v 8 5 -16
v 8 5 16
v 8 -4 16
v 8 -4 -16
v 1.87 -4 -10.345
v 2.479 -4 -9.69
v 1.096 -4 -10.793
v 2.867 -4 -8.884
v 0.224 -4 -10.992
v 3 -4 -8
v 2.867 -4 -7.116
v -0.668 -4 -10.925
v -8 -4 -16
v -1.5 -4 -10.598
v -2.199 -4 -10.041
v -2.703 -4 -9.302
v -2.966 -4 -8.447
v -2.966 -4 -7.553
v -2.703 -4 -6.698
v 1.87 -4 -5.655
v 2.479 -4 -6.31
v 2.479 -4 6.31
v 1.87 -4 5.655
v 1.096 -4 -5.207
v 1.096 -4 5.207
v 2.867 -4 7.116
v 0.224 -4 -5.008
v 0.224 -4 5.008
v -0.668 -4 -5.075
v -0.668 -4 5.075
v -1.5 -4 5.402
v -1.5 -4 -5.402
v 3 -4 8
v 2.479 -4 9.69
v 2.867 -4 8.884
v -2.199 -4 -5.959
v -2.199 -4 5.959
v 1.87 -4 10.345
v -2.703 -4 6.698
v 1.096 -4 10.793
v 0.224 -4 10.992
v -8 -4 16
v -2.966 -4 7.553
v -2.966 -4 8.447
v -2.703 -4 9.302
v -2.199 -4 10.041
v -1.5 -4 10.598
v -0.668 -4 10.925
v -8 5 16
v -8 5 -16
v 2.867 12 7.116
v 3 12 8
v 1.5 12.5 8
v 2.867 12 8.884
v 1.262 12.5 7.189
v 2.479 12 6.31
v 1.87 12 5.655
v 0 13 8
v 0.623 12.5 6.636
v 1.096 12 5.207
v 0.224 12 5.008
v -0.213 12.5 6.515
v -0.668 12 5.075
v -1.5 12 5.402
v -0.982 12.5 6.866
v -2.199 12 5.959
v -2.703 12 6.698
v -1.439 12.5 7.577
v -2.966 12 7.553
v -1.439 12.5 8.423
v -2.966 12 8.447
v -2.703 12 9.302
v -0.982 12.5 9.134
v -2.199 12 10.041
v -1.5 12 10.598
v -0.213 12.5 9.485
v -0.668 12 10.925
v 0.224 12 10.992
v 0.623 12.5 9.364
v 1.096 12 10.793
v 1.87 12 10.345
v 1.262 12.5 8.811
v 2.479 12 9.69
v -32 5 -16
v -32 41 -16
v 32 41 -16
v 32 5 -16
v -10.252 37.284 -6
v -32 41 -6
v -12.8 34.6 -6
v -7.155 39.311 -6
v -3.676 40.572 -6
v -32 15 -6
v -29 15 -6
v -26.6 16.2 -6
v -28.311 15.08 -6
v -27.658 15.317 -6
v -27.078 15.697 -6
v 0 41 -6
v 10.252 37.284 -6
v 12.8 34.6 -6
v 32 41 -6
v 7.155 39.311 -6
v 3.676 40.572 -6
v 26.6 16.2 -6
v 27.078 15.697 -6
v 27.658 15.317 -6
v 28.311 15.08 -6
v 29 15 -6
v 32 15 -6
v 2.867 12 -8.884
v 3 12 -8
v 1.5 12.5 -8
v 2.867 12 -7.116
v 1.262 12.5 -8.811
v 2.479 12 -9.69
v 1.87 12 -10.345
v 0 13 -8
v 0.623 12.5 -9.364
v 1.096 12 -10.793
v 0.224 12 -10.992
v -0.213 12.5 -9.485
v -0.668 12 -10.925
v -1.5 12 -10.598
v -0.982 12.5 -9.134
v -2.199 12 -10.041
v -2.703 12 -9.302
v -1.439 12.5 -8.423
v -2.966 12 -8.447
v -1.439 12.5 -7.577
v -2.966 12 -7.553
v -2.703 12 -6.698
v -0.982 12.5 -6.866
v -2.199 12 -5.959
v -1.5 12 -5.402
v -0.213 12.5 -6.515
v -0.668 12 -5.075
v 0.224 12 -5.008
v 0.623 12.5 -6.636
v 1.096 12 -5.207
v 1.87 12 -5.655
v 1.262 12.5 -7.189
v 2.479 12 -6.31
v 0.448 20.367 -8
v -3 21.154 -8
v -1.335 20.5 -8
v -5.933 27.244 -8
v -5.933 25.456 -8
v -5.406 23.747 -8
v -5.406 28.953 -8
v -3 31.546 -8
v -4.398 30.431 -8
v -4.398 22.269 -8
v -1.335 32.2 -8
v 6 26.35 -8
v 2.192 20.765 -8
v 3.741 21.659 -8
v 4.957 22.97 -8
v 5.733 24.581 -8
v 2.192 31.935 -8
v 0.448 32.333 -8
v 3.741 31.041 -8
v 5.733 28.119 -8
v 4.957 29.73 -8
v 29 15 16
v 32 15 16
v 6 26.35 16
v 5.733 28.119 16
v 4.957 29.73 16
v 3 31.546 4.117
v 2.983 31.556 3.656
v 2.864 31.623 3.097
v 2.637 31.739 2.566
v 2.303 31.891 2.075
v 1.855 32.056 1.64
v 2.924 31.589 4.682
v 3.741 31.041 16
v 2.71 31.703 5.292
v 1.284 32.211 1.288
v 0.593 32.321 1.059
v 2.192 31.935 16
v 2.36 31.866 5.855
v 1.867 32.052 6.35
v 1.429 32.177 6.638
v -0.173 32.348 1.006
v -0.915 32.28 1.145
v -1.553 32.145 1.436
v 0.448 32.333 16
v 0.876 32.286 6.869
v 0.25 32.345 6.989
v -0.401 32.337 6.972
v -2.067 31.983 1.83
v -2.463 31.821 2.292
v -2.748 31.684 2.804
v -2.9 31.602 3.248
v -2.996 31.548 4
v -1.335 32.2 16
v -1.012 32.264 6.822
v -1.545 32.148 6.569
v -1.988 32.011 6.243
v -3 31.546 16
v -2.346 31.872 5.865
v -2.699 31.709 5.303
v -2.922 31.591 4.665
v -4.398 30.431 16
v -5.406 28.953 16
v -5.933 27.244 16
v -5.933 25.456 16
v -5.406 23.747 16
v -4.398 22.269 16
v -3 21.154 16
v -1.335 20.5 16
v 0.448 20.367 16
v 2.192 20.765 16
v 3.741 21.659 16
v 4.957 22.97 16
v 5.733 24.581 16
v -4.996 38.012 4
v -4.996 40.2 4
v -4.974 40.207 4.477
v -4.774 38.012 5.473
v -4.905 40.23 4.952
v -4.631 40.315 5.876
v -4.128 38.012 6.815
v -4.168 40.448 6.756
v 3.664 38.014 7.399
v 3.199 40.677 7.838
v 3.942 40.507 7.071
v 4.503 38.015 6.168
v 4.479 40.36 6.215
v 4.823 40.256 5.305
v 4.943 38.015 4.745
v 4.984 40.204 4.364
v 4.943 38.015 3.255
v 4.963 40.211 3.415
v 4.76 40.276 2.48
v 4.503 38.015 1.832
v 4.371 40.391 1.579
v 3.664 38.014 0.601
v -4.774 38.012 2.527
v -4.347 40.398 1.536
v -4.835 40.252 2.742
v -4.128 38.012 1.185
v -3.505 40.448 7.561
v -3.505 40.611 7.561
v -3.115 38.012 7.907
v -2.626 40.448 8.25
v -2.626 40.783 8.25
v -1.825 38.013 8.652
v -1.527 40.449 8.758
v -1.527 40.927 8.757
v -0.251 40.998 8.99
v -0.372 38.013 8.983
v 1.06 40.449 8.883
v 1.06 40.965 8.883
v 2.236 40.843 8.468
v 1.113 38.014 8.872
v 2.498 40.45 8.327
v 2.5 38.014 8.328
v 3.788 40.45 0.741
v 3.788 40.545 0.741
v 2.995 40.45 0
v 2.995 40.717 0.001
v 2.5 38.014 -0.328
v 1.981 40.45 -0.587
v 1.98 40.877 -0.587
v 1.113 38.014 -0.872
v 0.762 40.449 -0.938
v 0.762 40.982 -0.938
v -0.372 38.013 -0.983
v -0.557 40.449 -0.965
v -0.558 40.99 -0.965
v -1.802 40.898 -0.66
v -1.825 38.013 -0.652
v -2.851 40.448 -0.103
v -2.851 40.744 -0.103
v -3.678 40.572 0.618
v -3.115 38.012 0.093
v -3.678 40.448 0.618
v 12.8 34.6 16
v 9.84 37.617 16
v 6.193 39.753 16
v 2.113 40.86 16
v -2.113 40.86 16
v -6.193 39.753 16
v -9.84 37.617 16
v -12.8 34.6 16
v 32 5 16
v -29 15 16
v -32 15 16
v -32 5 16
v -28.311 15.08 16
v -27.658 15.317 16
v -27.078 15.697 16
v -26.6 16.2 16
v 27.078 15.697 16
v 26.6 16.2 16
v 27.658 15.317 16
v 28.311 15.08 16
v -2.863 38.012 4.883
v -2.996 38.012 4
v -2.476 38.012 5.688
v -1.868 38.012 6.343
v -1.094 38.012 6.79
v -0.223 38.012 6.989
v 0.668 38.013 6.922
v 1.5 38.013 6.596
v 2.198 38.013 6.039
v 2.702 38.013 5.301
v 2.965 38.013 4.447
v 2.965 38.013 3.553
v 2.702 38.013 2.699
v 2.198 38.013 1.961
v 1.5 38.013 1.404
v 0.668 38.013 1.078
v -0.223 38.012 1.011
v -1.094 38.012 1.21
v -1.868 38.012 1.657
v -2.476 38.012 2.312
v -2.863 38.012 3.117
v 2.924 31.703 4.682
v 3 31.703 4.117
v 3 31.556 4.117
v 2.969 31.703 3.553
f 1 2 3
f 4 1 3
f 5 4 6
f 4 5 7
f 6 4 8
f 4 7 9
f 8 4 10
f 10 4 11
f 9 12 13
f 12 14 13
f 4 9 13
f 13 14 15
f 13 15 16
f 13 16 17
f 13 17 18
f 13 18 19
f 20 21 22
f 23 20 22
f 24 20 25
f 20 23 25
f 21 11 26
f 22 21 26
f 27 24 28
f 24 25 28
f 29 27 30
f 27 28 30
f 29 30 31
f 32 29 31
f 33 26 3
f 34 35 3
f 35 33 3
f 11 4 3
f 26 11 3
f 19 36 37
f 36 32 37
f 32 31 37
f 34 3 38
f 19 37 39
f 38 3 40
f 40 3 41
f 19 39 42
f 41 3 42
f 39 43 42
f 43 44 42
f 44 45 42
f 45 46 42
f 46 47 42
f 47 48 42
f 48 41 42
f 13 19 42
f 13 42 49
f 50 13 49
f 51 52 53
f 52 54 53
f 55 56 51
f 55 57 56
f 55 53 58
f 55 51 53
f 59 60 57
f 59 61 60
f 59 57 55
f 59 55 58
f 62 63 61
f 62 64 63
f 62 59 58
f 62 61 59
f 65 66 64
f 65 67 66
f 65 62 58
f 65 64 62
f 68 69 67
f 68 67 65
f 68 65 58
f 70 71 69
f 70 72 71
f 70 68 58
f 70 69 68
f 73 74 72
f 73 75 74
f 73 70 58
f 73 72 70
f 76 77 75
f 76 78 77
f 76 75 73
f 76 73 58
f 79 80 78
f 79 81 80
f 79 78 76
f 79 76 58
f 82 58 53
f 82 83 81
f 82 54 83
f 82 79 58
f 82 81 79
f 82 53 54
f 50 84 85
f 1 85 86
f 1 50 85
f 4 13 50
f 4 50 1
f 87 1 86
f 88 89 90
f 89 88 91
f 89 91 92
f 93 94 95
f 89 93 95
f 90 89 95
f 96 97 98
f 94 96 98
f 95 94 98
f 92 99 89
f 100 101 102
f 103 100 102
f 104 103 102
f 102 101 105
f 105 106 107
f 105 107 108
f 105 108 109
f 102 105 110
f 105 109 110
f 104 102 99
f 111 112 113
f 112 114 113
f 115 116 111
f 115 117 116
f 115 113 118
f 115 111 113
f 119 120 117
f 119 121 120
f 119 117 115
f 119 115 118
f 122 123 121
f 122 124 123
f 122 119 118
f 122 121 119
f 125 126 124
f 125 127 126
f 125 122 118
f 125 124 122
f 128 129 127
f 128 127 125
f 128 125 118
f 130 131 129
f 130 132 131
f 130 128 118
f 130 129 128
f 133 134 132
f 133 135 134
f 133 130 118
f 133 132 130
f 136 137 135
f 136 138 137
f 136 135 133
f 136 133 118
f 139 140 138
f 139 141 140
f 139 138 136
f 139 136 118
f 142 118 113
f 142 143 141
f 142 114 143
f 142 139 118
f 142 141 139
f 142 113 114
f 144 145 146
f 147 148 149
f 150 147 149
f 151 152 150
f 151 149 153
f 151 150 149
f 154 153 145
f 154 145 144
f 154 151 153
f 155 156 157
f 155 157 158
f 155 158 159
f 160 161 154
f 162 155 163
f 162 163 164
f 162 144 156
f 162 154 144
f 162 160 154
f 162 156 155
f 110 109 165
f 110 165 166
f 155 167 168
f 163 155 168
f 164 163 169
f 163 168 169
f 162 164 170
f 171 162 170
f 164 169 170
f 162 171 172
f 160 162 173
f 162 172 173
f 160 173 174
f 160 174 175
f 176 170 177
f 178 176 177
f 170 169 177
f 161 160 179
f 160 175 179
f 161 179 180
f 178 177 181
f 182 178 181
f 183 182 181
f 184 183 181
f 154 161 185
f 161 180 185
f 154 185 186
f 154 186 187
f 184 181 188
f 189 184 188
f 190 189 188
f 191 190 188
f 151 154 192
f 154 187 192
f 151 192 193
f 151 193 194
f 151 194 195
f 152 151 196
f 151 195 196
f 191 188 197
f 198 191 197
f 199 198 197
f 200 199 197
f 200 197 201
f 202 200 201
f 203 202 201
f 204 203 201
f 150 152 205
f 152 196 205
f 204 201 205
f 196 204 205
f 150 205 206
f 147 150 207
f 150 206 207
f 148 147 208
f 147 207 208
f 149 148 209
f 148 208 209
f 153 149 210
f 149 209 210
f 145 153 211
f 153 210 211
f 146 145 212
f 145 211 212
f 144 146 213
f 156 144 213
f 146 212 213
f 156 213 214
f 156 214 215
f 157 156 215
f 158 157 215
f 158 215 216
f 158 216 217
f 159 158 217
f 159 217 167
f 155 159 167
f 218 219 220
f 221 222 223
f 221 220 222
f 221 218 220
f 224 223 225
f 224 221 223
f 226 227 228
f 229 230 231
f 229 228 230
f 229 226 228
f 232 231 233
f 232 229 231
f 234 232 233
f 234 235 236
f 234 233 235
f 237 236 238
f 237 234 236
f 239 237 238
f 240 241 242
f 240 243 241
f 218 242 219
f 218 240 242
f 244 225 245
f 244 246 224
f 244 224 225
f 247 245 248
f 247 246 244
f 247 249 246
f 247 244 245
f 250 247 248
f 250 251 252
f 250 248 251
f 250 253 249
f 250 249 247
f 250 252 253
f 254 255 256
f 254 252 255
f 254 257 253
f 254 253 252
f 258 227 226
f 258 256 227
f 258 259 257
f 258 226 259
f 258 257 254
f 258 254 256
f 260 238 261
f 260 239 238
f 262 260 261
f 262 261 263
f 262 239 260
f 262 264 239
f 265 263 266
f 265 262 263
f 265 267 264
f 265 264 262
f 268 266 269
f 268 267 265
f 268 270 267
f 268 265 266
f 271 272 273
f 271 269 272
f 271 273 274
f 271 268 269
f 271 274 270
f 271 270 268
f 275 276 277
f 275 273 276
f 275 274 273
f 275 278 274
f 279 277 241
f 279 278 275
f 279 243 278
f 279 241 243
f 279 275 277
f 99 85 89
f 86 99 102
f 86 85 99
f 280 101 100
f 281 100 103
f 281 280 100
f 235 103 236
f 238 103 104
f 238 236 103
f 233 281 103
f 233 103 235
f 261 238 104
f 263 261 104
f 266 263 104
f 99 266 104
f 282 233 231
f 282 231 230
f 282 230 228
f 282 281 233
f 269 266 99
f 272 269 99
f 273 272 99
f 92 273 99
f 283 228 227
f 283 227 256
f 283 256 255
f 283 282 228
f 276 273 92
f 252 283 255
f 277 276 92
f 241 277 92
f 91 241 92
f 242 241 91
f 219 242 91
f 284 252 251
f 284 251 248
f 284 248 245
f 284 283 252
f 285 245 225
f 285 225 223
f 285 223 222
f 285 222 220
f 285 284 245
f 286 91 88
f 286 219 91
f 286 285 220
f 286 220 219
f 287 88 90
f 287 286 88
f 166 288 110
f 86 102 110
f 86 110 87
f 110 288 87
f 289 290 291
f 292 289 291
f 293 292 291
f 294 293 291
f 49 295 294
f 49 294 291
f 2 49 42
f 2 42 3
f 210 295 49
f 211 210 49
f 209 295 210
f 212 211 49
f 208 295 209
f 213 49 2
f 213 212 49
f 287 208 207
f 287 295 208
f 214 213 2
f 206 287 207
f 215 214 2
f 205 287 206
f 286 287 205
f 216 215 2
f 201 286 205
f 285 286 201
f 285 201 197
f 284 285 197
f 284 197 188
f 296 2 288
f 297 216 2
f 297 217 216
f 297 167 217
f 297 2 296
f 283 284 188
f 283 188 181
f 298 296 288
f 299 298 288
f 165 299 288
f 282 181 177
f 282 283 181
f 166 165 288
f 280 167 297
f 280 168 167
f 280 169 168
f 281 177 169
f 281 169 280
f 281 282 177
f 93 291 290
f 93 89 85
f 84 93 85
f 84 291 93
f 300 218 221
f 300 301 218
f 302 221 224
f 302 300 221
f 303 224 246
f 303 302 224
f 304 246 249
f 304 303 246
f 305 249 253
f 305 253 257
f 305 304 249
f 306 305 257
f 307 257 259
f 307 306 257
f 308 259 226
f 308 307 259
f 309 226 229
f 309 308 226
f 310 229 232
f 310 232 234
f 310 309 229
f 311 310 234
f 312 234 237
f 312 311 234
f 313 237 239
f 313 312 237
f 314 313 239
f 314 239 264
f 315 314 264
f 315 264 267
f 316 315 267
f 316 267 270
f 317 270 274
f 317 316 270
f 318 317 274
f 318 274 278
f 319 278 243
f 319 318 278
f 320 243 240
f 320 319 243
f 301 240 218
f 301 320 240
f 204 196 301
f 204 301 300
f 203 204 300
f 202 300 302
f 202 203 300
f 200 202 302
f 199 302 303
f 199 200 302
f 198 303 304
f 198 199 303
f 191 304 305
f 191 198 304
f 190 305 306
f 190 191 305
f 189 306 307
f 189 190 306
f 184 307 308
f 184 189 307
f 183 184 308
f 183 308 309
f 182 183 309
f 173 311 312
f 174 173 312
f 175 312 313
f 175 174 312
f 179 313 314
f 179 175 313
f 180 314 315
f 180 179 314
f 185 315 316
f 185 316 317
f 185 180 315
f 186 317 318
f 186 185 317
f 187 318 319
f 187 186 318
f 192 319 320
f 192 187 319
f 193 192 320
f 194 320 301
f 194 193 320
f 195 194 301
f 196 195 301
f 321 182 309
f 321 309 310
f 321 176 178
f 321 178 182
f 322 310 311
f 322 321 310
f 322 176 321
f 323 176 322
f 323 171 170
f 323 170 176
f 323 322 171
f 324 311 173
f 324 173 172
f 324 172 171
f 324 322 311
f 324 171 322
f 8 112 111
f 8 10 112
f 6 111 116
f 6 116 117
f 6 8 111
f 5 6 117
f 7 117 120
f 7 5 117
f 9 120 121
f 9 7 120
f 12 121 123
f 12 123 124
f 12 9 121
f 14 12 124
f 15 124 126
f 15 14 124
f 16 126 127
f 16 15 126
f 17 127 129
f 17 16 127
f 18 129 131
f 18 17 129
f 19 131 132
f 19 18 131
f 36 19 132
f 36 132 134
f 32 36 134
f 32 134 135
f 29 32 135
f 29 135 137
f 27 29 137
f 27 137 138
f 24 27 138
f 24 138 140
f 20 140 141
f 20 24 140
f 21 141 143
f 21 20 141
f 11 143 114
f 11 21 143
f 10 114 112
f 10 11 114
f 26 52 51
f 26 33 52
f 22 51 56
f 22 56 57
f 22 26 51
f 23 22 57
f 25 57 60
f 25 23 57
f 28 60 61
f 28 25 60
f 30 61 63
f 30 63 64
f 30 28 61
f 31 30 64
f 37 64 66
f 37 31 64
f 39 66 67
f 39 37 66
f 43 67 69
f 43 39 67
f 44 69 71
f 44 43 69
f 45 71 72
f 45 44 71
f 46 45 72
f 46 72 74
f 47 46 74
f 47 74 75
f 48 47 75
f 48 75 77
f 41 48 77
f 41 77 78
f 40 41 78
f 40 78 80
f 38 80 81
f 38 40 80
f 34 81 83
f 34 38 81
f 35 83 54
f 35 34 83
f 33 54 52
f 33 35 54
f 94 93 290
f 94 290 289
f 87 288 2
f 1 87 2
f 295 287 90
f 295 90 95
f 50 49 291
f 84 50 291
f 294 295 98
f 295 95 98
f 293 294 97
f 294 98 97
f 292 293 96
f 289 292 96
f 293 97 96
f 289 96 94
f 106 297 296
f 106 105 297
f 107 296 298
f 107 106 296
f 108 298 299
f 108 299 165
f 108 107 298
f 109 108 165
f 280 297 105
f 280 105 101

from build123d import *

# Parameters (mm, degrees)
SKETCH2_W           = 64
SKETCH2_H           = 32
BOSS_EXTRUDE1_DEPTH = 5
SKETCH3_W           = 64
SKETCH3_H           = 10
BOSS_EXTRUDE2_DEPTH = 36
SKETCH4_W           = 64
SKETCH4_H           = 22
BOSS_EXTRUDE3_DEPTH = 10
BOSS_EXTRUDE4_DEPTH = 22
CUT_EXTRUDE1_DEPTH  = 33
SKETCH7_R           = 6
CUT_EXTRUDE2_DEPTH  = 24
LPATTERN1_COUNT     = 2
LPATTERN1_PITCH     = 16
FILLET1_R           = 3


with BuildPart() as part:
    # Sketch2 → Boss-Extrude1 (new body, symmetric)
    with BuildSketch(Plane(origin=(0, 0, 0), x_dir=(1, 0, 0), z_dir=(0, 1, 0))):
        Rectangle(SKETCH2_W, SKETCH2_H)
    extrude(amount=BOSS_EXTRUDE1_DEPTH, both=True)

    # Sketch3 → Boss-Extrude2 (add)
    with BuildSketch(Plane(origin=(0, 5, 0), x_dir=(1, 0, 0), z_dir=(0, 1, 0))):
        with Locations((0, 11)):
            Rectangle(SKETCH3_W, SKETCH3_H)
    extrude(amount=BOSS_EXTRUDE2_DEPTH)

    # Sketch4 → Boss-Extrude3 (add)
    with BuildSketch(Plane(origin=(0, 5, 0), x_dir=(1, 0, 0), z_dir=(0, 1, 0))):
        with Locations((0, -5)):
            Rectangle(SKETCH4_W, SKETCH4_H)
    extrude(amount=BOSS_EXTRUDE3_DEPTH)

    # Sketch5 → Boss-Extrude4 (add)
    with BuildSketch(Plane.XY.offset(16)):
        with BuildLine():
            Line((-27.5, 15), (27.5, 15))
            Line((27.5, 15), (12.8, 34.6))
            ThreePointArc((12.8, 34.6), (0, 41), (-12.8, 34.6))
            Line((-12.8, 34.6), (-27.5, 15))
        make_face()
    extrude(amount=-BOSS_EXTRUDE4_DEPTH)

    # Sketch6 → Cut-Extrude1 (cut)
    with BuildSketch(Plane.XY.offset(16)):
        Polygon((-32, 5), (-32, -5), (32, -5), (32, 5), (8, 5), (8, -4), (-8, -4), (-8, 5), align=None)
    extrude(amount=-CUT_EXTRUDE1_DEPTH, mode=Mode.SUBTRACT)

    # Sketch7 → Cut-Extrude2 (cut)
    with BuildSketch(Plane.XY.offset(16)):
        with Locations((0, 26.35)):
            Circle(SKETCH7_R)
    extrude(amount=-CUT_EXTRUDE2_DEPTH, mode=Mode.SUBTRACT)

    # Sketch10 → Cut-Revolve2 (revolve, cut)
    with BuildSketch(Plane.XY.offset(8)):
        Polygon((0, -4), (0, 13), (3, 12), (3, -4), align=None)
    cut_revolve2 = revolve(axis=Axis((0, -4, 8), (0, 1, 0)), mode=Mode.SUBTRACT)

    # LPattern1: Cut-Revolve2 ×2
    with Locations(*[(0, 0, -i * LPATTERN1_PITCH) for i in range(1, LPATTERN1_COUNT)]):
        add(cut_revolve2, mode=Mode.SUBTRACT)

    # Sketch15 → Cut-Revolve4 (revolve, cut)
    with BuildSketch(Plane(origin=(0, 0, 4), x_dir=(-1, 0, 0), z_dir=(0, 0, -1))):
        Polygon((-0.003619483, 30.011523803), (0, 41), (4.996380517, 41.011523803), (4.996380517, 38.011523803), (2.996380517, 38.011523803), (2.996380517, 31.011523803), align=None)
    revolve(axis=Axis((0.003619483, 30.011523803, 4), (-0.000329389, 0.999999946, 0)), mode=Mode.SUBTRACT)

    # Fillet1
    fillet1_edges = [part.edges().sort_by_distance(p)[0] for p in [
        (27.5, 15, 5),
        (-27.5, 15, 5),
    ]]
    fillet(fillet1_edges, radius=FILLET1_R)


solid = part.part
